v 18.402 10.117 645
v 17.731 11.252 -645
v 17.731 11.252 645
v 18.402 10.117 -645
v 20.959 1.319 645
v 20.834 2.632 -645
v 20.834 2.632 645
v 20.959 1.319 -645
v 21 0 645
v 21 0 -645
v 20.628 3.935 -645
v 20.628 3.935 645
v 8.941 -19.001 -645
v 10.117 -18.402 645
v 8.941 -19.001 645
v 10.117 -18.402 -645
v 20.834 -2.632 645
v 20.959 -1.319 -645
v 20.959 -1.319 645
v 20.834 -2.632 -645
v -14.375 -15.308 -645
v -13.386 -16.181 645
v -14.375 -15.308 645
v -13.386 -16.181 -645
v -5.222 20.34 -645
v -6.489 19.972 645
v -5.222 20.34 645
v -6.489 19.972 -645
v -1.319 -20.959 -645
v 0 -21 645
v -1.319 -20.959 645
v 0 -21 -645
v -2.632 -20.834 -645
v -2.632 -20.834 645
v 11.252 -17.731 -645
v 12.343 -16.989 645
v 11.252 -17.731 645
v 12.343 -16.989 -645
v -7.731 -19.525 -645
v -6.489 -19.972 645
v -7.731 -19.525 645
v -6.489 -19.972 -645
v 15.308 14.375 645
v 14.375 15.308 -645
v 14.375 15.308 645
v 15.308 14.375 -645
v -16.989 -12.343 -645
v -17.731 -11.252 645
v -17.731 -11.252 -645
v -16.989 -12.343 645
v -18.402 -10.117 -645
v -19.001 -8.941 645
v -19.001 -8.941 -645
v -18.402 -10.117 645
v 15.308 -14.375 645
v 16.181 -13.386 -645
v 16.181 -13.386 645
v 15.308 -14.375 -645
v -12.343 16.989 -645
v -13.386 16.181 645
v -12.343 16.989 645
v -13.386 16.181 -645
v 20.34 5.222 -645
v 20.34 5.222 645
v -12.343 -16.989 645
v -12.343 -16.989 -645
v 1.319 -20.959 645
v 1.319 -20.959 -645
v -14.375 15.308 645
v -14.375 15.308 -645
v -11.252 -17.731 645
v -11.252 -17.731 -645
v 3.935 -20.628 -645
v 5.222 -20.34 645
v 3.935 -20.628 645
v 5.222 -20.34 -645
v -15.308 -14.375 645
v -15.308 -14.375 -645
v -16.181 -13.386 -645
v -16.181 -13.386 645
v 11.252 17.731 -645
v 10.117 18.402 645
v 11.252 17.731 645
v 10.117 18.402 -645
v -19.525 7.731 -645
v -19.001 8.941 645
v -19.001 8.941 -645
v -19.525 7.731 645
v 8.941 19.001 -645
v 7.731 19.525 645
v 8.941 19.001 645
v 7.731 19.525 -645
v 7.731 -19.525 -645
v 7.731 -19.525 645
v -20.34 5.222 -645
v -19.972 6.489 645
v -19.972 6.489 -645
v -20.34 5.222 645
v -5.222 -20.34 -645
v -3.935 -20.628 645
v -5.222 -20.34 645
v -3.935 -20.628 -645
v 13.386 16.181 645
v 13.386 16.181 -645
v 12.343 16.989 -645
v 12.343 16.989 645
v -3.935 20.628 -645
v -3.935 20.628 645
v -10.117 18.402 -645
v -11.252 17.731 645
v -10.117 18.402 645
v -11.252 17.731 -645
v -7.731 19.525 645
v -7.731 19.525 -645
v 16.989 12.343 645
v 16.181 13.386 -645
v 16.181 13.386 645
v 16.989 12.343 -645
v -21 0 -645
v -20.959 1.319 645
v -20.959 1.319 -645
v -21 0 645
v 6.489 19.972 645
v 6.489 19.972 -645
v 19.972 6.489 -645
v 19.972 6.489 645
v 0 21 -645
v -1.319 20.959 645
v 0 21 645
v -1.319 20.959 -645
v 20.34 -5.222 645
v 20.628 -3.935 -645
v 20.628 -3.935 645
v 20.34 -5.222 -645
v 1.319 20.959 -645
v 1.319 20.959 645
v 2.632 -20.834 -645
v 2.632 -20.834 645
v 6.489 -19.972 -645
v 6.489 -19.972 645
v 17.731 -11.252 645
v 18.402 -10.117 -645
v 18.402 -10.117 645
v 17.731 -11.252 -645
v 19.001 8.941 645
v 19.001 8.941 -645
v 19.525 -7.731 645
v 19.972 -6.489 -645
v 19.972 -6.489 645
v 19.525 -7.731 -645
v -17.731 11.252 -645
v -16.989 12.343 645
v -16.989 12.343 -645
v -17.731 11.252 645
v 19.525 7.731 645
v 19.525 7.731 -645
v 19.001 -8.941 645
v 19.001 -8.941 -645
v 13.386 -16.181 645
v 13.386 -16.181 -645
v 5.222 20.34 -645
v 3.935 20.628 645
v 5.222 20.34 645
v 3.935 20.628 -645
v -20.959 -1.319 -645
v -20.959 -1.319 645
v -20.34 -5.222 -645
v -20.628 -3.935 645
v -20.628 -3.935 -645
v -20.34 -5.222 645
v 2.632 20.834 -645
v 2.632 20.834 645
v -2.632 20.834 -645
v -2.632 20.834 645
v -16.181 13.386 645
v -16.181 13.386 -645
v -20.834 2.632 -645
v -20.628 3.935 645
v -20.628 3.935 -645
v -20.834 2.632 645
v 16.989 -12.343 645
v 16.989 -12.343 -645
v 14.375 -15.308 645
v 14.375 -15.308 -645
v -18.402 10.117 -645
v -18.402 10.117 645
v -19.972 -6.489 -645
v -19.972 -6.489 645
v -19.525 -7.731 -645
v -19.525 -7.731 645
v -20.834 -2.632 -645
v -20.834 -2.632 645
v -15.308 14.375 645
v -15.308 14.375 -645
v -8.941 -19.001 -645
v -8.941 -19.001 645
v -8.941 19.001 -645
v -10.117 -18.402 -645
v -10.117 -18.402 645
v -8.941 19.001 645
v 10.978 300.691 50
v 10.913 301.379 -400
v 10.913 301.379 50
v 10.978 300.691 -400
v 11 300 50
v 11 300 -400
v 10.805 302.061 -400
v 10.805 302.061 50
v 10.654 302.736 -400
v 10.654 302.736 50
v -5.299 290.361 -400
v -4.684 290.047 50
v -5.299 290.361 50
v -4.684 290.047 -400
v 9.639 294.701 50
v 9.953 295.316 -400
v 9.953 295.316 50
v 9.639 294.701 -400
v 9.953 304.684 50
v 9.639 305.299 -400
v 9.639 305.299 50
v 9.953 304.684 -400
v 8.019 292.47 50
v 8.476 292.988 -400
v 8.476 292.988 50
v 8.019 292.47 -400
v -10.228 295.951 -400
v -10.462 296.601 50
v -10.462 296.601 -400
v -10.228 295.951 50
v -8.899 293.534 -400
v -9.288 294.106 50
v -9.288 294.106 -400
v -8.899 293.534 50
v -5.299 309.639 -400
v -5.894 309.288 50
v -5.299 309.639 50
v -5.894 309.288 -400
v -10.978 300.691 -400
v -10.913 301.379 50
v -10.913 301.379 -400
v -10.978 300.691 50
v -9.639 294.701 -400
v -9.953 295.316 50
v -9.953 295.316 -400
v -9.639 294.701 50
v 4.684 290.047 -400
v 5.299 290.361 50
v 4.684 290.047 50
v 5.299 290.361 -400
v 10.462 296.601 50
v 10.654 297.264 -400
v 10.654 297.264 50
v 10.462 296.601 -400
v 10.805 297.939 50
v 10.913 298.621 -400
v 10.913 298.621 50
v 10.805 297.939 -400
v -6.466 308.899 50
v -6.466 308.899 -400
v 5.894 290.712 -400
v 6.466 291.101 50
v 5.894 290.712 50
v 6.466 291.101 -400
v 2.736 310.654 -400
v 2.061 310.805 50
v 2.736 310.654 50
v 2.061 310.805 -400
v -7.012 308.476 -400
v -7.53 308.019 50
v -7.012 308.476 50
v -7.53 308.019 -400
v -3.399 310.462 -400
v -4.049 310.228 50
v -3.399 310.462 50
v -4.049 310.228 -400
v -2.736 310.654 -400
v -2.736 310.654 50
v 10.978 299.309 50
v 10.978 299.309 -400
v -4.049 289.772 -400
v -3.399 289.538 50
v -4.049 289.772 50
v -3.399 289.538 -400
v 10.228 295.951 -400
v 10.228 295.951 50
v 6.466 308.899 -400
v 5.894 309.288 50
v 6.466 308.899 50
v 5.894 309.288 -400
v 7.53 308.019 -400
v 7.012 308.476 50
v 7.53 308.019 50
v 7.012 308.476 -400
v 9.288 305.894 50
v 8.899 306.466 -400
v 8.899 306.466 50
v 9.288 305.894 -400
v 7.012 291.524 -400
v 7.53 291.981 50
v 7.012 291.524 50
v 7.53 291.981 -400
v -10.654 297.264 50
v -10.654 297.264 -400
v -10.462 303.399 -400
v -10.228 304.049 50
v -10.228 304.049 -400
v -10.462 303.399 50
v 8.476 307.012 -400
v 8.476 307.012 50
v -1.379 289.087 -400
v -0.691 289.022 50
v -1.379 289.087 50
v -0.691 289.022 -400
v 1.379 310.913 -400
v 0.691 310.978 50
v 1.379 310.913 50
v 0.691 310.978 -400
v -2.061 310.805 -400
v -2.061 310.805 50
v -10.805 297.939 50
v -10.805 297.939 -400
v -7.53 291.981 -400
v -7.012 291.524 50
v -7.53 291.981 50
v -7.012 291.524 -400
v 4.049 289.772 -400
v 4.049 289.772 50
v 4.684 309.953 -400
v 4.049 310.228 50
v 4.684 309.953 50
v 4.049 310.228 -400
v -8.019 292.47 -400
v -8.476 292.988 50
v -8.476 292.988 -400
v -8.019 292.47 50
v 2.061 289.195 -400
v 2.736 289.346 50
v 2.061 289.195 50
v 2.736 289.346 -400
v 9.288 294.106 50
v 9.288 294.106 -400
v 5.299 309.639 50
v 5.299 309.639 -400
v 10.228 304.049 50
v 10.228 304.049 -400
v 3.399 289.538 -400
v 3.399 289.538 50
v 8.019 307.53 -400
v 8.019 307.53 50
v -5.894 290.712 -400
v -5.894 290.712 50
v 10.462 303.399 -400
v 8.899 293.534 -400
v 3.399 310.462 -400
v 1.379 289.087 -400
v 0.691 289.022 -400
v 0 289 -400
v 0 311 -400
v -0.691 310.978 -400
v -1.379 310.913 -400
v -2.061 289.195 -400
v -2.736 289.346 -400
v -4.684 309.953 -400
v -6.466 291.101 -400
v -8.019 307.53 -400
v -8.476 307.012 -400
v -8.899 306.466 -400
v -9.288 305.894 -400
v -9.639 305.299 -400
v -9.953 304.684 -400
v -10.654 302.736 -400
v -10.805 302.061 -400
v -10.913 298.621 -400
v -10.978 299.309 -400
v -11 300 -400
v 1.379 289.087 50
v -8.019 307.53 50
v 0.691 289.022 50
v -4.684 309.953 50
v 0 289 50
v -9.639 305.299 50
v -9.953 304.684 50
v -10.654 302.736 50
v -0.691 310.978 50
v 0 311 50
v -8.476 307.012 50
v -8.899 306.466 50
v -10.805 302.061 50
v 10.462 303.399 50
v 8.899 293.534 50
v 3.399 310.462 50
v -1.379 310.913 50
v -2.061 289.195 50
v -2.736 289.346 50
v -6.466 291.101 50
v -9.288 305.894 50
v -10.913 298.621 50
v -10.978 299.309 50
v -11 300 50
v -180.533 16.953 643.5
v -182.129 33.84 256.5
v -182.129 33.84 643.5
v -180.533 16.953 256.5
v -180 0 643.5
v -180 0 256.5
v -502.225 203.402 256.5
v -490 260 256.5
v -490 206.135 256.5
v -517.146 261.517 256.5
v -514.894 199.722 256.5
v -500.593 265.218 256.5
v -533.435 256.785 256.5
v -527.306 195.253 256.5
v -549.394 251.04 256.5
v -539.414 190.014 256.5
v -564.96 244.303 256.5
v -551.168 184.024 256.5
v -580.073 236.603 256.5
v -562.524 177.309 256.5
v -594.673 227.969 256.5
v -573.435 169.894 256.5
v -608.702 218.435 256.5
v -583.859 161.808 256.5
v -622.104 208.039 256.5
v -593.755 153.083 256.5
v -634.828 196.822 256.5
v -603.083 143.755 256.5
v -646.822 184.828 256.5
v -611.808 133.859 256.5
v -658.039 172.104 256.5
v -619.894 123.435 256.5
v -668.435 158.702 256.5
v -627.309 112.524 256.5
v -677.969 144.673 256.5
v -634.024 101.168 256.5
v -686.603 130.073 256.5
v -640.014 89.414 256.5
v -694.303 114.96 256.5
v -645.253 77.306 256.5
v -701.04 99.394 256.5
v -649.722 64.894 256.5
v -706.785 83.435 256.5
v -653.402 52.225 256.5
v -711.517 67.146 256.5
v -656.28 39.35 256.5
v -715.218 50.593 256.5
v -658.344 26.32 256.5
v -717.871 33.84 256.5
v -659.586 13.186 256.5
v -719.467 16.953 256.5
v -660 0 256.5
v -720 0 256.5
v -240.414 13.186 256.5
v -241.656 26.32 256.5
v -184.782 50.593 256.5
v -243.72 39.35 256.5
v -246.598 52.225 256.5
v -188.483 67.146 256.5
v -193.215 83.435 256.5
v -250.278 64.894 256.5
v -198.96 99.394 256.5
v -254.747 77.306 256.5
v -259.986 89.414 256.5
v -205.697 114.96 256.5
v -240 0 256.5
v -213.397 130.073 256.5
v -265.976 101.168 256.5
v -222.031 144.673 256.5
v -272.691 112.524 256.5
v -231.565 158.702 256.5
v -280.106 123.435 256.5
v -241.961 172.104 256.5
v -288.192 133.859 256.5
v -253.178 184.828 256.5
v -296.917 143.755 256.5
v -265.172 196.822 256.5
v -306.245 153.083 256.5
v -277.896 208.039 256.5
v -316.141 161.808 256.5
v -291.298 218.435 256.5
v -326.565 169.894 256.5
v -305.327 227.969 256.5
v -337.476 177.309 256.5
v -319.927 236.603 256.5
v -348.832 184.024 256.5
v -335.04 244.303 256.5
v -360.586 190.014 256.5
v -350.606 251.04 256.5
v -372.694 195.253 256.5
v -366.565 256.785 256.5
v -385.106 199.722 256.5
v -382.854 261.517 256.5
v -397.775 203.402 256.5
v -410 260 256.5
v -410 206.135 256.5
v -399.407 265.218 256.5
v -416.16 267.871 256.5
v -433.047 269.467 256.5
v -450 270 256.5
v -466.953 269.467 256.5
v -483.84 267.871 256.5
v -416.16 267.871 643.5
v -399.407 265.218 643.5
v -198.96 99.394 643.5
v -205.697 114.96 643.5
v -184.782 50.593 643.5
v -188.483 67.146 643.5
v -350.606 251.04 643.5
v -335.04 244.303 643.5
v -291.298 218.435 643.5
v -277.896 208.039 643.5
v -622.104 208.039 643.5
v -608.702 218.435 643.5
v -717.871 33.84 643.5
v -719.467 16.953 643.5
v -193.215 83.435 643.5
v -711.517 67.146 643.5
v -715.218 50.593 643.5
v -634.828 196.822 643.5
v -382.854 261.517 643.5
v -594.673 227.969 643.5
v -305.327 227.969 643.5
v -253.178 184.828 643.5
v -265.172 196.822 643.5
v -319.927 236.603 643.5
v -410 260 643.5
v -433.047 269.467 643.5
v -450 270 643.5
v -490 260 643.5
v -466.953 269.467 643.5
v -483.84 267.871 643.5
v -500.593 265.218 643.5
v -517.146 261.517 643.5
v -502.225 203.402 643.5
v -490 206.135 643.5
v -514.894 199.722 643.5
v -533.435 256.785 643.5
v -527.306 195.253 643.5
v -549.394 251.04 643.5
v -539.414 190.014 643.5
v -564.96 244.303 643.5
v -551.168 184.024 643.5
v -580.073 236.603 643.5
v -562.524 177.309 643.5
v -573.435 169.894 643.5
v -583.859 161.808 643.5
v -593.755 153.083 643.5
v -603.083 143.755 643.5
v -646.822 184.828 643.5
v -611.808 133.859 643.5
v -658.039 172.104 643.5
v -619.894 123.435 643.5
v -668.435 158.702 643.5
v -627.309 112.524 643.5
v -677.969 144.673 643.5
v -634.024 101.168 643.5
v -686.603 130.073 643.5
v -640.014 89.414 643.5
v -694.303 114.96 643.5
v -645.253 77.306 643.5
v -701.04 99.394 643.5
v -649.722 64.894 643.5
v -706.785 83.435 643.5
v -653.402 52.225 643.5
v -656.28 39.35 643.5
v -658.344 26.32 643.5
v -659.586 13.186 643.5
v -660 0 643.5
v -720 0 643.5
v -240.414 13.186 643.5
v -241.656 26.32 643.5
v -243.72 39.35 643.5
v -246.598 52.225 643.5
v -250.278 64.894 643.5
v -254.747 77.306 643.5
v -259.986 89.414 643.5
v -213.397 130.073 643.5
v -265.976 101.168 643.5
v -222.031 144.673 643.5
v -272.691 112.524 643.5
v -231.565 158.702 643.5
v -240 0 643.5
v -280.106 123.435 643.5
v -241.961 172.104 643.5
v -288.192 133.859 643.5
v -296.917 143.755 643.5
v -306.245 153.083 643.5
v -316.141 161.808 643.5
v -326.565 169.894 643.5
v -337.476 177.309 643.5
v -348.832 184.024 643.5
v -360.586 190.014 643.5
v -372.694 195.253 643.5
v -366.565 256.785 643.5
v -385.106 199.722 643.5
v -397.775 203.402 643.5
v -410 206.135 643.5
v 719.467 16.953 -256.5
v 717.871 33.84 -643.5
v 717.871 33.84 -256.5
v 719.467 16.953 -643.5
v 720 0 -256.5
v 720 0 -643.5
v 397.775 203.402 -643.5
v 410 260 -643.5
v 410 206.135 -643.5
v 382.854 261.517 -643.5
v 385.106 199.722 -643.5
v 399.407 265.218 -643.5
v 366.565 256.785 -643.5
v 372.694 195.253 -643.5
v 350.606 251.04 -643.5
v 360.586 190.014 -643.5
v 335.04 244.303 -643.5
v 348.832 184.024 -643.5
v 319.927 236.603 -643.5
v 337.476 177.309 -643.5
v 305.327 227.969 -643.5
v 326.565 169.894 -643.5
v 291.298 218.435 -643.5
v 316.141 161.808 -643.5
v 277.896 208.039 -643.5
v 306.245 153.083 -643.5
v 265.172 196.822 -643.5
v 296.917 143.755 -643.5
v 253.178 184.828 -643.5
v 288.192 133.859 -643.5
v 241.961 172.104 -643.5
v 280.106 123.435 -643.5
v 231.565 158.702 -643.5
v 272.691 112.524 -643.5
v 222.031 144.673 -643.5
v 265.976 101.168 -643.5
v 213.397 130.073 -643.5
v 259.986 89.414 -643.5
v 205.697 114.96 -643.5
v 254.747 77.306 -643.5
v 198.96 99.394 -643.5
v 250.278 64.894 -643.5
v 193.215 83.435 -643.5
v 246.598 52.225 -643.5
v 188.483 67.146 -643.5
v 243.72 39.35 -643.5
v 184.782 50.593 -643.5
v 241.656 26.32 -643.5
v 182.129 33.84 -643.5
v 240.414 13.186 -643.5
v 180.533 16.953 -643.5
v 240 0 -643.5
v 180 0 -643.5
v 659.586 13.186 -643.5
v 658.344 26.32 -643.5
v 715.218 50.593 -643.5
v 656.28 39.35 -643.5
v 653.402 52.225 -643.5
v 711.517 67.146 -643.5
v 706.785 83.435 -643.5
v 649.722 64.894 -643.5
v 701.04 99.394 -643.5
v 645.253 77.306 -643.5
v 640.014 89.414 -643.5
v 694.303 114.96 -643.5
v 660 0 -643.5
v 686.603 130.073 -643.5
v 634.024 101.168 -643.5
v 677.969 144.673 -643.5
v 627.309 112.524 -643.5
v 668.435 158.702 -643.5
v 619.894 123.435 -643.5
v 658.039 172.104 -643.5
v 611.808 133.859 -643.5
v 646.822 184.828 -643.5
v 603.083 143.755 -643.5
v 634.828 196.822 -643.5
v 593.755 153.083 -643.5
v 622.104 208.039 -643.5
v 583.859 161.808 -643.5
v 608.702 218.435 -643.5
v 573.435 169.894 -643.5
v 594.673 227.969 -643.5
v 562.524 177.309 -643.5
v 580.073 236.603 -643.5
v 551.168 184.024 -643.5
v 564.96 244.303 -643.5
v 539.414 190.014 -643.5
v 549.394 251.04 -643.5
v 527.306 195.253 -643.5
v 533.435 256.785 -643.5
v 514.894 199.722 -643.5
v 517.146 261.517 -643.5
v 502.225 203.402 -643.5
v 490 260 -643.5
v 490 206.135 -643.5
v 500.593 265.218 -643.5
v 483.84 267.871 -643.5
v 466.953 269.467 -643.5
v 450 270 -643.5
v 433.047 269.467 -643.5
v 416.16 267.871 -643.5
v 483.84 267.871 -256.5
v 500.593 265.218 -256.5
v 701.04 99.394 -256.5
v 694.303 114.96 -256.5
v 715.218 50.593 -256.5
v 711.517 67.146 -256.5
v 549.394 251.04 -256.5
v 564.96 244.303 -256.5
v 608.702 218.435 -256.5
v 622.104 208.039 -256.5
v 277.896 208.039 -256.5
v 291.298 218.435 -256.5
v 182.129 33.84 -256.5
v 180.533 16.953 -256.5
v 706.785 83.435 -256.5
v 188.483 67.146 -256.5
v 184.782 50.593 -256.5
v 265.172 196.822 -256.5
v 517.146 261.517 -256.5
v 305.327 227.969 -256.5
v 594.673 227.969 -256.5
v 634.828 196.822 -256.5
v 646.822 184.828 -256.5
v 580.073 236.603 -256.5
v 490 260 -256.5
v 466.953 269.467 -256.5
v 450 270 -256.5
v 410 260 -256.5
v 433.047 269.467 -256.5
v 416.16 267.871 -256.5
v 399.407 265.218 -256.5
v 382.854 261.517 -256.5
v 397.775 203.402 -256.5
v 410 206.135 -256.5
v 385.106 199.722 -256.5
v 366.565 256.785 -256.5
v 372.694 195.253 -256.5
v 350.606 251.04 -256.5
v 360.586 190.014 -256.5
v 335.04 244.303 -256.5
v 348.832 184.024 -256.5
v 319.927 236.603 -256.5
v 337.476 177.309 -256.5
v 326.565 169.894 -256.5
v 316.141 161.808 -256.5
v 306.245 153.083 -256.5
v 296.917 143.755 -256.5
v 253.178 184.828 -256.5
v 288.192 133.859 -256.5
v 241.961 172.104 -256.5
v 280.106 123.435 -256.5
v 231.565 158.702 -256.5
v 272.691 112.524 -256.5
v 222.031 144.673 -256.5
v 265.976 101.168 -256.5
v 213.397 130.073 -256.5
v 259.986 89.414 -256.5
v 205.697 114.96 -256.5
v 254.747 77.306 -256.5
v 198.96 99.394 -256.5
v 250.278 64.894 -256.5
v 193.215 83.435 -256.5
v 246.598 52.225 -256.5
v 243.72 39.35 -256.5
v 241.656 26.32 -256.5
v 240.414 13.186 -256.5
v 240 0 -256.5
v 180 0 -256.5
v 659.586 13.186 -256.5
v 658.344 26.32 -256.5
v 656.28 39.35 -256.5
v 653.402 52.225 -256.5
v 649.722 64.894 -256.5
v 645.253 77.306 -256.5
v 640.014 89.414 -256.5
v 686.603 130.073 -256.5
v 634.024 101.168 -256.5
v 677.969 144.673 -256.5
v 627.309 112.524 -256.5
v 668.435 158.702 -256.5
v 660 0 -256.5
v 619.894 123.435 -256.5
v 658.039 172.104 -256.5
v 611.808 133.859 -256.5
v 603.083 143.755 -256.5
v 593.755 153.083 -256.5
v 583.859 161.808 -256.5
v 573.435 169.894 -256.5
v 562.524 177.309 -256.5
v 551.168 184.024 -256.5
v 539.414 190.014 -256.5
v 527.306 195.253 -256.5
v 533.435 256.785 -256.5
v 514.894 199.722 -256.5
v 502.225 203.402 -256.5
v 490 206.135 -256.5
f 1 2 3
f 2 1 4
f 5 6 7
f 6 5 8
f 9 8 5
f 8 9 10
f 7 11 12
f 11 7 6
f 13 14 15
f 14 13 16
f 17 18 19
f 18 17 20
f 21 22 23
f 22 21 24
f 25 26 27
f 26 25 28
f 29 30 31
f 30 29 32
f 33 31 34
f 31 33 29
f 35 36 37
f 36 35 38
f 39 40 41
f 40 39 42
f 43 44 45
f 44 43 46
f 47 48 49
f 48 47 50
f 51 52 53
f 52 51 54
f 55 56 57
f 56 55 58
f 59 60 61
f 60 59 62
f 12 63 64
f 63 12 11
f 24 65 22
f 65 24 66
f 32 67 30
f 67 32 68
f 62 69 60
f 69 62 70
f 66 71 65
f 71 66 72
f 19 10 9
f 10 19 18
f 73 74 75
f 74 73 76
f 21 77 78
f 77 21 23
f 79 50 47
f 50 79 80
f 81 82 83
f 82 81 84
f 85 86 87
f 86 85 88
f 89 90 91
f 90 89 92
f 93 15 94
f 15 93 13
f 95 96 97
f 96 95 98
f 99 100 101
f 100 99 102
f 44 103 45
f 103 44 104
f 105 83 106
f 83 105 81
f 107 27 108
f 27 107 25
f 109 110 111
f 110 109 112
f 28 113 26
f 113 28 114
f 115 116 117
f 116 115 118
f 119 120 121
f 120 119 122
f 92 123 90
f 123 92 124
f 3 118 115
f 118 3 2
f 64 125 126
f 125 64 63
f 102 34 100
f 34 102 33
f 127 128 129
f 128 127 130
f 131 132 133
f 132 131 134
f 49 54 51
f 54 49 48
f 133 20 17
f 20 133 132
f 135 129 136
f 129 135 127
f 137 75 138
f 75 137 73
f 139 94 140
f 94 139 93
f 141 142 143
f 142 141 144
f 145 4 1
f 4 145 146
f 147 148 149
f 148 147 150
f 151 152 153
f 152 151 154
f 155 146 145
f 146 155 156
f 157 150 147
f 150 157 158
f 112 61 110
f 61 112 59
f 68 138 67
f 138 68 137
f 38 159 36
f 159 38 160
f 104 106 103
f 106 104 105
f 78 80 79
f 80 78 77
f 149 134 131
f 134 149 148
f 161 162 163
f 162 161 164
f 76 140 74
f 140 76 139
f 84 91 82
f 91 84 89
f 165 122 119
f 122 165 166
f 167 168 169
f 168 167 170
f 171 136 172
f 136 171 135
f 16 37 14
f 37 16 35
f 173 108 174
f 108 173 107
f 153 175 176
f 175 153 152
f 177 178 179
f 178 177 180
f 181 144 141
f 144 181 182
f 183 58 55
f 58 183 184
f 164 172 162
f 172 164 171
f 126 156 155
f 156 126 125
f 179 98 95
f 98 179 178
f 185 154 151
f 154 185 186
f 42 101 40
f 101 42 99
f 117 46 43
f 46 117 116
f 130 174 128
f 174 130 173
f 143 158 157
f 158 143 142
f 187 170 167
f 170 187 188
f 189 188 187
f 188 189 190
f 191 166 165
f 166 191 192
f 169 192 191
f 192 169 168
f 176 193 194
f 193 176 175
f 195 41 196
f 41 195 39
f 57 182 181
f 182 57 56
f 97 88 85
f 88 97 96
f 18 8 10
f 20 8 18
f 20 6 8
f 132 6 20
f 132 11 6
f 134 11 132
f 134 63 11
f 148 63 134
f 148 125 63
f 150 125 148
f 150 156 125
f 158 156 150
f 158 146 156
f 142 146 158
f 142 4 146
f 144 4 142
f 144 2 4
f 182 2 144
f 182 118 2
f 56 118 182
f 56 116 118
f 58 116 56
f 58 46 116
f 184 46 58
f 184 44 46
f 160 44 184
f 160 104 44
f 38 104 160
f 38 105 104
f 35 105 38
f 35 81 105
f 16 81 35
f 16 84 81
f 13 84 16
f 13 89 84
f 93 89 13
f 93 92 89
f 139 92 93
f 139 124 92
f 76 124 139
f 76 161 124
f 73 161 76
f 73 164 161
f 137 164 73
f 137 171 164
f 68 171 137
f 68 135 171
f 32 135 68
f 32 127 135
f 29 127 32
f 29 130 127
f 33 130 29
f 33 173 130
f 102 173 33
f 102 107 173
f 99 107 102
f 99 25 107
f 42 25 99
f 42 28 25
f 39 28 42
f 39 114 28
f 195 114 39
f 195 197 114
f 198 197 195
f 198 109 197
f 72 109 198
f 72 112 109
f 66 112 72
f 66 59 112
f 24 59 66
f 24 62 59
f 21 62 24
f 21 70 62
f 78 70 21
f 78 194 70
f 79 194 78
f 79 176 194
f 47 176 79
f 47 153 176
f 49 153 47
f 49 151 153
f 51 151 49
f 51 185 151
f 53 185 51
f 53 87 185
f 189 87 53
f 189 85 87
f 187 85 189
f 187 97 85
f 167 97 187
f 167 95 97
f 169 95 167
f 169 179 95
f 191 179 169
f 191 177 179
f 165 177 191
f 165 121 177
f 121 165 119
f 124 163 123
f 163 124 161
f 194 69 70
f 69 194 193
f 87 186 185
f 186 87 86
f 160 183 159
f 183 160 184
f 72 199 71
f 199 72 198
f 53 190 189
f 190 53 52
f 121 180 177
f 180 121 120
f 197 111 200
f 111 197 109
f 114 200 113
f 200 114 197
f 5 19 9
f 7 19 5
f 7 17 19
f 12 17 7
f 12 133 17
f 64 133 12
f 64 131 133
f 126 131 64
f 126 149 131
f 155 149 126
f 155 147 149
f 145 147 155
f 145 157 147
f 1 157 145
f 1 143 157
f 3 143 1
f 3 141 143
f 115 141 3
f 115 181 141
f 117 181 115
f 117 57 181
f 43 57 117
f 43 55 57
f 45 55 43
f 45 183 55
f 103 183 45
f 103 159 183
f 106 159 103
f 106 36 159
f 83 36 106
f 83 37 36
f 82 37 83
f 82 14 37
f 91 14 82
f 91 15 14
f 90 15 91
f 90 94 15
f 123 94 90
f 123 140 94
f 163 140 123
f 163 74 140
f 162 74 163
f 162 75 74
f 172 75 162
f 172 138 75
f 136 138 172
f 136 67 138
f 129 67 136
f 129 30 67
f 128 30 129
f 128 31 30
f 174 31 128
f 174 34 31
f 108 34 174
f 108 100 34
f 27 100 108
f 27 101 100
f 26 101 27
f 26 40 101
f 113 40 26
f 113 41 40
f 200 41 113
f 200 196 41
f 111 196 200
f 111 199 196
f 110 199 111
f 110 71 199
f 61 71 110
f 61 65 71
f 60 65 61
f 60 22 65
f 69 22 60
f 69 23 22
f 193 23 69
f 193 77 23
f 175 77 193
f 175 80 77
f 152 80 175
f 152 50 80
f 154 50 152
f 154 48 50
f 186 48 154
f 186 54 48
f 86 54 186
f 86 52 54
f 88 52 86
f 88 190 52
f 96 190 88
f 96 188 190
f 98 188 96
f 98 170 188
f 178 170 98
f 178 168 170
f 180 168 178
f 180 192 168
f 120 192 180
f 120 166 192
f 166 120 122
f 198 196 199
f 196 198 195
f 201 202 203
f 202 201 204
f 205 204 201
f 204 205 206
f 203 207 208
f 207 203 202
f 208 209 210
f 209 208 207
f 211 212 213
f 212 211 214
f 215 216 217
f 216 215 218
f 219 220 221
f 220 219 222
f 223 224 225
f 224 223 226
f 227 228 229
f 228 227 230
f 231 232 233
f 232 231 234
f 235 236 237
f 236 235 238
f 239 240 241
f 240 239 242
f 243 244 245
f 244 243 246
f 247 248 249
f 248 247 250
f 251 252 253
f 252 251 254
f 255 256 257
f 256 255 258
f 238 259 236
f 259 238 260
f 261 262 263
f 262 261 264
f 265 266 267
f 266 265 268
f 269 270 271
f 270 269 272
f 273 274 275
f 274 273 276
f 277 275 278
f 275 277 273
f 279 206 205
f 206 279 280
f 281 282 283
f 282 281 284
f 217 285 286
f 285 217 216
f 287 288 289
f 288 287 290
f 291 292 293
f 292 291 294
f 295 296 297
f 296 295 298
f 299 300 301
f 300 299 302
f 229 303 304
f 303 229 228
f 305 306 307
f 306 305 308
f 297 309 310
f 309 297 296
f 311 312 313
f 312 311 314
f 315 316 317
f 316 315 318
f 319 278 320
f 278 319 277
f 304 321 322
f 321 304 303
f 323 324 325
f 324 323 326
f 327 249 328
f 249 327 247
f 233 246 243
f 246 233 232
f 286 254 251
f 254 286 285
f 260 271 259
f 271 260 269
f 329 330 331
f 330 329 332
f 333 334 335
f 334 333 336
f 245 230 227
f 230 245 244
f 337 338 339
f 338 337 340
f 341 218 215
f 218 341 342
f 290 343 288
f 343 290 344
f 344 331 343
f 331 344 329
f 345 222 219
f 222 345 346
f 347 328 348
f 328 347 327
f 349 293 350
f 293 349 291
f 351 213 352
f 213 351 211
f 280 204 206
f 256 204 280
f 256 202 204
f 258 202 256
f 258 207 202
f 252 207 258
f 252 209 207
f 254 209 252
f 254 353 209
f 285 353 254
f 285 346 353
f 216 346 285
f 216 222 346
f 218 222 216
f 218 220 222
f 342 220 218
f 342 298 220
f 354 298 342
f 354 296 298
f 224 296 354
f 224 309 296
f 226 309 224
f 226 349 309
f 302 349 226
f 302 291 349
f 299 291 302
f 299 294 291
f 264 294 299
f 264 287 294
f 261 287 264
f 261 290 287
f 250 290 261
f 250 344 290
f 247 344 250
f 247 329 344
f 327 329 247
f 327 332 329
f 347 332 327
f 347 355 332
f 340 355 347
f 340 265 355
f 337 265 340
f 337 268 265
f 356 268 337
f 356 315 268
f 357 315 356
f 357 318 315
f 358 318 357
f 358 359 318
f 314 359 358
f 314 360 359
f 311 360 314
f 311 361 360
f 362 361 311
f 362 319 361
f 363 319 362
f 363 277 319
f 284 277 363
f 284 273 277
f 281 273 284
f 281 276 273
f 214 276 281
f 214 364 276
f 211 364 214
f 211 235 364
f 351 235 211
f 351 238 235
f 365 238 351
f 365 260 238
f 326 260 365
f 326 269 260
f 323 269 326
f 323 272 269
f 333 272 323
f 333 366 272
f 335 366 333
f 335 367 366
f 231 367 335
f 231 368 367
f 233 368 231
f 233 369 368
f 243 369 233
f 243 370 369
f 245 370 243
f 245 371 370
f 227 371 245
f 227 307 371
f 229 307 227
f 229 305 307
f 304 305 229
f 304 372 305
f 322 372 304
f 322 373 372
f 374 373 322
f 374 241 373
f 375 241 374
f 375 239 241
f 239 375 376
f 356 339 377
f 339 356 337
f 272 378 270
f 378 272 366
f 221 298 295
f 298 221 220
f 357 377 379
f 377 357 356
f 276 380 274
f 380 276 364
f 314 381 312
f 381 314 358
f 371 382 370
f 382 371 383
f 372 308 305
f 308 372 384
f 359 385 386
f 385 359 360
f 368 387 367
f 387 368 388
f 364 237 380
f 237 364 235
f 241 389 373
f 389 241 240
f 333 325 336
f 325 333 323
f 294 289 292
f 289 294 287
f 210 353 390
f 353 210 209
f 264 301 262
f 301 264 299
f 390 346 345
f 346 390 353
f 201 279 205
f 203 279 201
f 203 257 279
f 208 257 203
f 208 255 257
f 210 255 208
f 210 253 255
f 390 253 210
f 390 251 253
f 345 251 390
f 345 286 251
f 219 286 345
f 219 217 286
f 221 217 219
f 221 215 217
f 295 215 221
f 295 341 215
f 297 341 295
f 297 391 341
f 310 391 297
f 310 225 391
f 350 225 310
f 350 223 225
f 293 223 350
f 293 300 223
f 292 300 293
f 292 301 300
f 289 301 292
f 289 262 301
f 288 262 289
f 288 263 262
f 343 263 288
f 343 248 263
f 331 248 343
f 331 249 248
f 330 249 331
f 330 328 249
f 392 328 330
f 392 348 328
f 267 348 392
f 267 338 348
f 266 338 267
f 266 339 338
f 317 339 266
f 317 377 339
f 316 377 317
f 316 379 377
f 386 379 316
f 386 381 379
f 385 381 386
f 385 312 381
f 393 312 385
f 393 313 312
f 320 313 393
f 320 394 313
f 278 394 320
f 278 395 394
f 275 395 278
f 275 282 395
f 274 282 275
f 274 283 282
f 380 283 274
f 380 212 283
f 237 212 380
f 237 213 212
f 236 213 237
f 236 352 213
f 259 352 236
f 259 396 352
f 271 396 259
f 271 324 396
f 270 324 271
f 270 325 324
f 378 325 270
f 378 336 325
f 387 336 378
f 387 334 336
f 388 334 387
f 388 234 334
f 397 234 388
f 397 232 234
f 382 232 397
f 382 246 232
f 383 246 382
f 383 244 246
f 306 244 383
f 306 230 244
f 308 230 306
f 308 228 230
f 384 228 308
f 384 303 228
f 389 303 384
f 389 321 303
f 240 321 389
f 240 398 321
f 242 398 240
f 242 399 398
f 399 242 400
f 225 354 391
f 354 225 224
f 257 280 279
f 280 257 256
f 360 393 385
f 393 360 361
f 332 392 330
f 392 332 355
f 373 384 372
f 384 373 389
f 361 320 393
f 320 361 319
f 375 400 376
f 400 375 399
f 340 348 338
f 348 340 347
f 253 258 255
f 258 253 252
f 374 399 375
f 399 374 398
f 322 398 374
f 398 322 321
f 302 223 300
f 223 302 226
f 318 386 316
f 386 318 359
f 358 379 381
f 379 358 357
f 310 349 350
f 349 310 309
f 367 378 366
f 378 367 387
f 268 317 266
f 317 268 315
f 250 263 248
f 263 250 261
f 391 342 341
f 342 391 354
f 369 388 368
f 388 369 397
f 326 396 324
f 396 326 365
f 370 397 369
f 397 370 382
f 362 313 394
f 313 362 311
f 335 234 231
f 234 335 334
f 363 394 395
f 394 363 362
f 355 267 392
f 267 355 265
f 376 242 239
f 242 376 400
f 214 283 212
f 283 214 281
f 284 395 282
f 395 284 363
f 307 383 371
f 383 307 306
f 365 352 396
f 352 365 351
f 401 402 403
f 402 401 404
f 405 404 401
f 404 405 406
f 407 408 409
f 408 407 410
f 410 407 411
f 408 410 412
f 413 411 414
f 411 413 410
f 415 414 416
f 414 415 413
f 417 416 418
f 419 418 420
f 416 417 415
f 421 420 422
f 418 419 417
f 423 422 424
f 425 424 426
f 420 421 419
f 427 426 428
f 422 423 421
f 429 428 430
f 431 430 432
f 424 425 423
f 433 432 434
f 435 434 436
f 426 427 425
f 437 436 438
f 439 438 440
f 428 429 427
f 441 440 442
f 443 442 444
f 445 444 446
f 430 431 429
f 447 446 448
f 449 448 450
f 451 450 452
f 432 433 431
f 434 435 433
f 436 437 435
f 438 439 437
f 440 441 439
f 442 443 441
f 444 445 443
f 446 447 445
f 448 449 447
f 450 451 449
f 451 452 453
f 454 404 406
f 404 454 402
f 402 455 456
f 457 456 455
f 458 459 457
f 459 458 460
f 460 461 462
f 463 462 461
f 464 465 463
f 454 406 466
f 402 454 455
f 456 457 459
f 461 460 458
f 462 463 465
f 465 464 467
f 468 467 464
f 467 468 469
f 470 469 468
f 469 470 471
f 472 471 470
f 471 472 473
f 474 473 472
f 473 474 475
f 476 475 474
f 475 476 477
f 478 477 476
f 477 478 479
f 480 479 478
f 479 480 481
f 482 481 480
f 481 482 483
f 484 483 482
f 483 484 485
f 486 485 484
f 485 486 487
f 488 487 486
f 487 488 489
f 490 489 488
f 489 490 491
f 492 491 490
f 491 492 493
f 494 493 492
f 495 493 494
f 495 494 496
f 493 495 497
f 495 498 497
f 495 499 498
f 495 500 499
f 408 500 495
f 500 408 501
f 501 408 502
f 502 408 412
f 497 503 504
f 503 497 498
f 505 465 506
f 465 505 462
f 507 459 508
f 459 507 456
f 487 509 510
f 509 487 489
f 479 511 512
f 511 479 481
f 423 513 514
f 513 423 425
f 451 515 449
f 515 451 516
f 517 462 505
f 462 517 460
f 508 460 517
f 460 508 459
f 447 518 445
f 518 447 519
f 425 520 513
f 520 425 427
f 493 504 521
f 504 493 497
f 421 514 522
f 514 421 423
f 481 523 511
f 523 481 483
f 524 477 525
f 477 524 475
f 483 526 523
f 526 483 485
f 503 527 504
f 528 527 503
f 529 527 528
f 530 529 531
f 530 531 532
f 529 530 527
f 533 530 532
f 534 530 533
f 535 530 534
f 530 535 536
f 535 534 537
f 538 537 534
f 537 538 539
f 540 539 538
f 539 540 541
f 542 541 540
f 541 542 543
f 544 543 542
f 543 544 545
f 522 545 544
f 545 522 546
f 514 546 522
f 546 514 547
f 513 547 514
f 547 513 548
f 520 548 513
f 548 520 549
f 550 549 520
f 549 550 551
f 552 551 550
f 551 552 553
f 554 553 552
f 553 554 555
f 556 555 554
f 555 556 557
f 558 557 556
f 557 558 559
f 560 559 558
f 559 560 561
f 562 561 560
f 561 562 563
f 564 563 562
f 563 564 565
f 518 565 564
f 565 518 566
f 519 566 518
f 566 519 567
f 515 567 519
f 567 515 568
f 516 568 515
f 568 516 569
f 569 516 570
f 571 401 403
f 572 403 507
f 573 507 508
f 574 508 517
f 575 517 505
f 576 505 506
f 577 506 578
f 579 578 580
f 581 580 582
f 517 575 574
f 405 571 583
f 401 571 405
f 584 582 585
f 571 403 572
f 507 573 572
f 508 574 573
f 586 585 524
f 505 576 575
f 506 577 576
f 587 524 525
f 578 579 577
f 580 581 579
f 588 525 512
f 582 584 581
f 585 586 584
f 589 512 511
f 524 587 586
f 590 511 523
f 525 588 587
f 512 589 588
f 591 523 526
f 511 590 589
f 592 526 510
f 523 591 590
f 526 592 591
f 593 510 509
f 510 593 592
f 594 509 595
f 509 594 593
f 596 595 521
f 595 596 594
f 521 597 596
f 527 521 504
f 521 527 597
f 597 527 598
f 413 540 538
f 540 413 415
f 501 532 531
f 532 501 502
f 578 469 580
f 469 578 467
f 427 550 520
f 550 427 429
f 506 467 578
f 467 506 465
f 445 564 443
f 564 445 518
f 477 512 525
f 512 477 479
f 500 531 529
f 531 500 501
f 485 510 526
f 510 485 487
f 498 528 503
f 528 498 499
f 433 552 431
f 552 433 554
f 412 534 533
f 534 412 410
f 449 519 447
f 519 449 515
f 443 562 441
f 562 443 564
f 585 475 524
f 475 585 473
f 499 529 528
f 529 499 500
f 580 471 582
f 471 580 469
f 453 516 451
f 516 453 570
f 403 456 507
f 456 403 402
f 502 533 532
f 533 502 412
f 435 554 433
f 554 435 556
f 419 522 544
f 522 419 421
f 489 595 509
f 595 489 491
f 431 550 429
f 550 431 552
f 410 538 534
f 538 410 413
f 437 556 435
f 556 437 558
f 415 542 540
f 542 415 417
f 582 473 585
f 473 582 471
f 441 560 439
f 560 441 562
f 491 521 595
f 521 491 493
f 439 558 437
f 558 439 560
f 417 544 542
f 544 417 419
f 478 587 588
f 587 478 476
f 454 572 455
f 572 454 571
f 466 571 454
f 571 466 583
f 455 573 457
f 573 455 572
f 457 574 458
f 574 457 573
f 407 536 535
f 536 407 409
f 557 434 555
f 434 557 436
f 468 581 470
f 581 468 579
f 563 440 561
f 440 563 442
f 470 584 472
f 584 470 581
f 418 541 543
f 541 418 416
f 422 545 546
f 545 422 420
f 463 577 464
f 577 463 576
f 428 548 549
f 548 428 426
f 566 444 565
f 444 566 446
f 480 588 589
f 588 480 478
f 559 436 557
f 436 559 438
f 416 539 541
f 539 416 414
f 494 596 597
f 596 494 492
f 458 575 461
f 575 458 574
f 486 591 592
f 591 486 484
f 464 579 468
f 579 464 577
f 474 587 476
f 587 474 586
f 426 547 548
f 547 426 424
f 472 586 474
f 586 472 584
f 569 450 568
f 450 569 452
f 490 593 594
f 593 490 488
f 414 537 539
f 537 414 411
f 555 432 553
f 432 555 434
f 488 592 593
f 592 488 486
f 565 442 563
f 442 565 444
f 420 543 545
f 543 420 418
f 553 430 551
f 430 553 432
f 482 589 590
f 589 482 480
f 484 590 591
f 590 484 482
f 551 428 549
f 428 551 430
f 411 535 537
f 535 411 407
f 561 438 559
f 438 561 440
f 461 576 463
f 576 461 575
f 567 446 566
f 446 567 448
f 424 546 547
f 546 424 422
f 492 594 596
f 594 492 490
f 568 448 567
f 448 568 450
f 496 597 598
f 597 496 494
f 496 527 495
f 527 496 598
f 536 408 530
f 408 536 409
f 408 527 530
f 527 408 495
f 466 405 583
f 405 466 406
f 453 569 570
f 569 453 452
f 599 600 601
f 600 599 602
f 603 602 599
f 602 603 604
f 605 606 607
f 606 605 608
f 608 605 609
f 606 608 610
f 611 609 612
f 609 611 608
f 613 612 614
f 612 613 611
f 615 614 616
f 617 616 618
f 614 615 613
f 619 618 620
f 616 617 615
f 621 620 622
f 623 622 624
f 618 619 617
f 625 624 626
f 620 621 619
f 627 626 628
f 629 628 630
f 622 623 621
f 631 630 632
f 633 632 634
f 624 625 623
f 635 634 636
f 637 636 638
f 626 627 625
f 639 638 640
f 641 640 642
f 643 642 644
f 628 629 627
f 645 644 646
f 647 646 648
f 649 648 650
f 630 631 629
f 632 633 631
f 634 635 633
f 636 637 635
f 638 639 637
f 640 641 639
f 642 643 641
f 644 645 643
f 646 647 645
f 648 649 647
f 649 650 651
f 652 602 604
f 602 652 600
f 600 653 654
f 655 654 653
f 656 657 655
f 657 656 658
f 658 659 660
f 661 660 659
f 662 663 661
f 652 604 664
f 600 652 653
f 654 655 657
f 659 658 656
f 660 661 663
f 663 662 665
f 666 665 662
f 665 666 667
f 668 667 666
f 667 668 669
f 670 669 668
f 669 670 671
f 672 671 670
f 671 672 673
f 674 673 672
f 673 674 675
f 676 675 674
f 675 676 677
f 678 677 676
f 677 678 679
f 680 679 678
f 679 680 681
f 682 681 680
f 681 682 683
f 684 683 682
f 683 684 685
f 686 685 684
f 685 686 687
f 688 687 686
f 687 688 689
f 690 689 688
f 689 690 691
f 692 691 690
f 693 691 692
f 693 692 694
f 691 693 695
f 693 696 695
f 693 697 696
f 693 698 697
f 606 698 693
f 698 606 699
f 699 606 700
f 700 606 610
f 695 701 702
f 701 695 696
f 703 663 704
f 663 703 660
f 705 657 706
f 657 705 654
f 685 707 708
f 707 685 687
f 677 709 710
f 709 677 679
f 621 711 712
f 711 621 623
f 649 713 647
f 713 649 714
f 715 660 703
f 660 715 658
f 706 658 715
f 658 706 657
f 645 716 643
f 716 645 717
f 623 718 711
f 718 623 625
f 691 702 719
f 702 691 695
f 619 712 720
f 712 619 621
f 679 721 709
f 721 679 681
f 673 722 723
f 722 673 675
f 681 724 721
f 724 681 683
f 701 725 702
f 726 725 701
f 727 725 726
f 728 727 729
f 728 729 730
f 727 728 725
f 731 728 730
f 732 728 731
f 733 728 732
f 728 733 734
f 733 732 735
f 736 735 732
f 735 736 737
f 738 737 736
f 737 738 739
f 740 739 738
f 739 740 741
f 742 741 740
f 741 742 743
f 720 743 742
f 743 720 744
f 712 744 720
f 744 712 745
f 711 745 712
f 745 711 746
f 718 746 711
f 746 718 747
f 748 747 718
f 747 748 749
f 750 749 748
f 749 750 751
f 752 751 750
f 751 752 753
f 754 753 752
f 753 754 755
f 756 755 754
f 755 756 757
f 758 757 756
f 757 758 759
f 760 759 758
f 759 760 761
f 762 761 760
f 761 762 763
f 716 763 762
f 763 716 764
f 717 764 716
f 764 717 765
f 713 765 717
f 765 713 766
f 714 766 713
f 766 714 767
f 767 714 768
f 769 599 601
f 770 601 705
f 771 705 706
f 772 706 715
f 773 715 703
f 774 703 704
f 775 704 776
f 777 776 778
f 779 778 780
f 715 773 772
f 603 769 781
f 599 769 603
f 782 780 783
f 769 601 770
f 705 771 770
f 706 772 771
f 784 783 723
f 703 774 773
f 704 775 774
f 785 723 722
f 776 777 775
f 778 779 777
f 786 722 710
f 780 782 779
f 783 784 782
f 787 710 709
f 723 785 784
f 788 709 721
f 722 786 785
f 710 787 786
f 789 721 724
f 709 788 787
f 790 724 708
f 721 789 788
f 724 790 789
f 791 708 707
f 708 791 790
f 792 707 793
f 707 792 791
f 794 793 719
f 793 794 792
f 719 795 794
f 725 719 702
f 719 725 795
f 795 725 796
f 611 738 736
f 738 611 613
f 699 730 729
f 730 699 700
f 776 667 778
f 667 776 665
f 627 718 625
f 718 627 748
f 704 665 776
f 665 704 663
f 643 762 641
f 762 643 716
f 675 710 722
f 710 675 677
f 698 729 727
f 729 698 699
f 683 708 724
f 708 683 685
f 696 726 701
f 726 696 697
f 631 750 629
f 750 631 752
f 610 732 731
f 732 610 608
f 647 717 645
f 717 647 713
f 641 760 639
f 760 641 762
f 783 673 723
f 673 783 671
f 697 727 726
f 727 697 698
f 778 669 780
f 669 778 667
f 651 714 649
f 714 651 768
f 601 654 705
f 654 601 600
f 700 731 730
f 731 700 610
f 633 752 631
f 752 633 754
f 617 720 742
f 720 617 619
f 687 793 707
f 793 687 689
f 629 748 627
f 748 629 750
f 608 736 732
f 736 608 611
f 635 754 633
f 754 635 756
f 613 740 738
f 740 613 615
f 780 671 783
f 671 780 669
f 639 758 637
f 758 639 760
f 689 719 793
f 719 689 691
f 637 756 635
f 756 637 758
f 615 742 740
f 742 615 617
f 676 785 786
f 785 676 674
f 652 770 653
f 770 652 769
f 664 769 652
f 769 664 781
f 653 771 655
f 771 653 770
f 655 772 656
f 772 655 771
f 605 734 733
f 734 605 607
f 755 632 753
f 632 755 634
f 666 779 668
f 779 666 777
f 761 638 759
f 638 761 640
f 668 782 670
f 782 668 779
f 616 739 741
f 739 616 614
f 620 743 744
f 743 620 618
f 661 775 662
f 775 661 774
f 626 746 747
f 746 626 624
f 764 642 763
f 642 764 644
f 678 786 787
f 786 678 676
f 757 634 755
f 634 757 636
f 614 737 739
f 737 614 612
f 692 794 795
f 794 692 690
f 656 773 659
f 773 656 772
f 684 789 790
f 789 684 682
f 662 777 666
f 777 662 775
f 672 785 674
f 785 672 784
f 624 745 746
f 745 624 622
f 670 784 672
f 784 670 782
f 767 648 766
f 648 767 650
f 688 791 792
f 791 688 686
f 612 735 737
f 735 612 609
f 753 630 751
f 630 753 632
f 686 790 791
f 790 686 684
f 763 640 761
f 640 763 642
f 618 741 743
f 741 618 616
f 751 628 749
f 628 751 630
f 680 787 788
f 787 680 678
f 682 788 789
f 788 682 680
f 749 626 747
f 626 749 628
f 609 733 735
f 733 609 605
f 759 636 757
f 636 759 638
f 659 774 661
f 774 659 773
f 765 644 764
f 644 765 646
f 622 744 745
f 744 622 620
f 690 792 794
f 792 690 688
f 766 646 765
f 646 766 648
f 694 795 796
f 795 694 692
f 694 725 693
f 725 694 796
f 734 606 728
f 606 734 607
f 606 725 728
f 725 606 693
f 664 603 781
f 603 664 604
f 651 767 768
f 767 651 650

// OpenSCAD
// ============================================================================
// PROJECT: XXXG-00W0 WING GUNDAM ZERO EW - LOWER AIRFRAME CORE INFRA
// COMPONENT VAULT: BANDAI CAST RUNNER F - BACKFRAME HINGES F17 & F18
// PACKAGING RE-ARCHITECTURE: SUB-ARMOR CAPACITOR RECESSED BANK INTEGRATION
// CONFIG METRIC: SCALED TITANIUM CASTS (1:1 ACTUAL METRIC UP-SCALE)
// ============================================================================

$fn = 100; // Circular segment rendering resolution count

// Structural Constants Scaled 1:1 for a 16.7-Meter Airframe Scale (mm)
hinge_total_length = 860;                // Total longitudinal vertical height (mm)
pivot_bore_diameter = 420;               // Core cycloidal stabilizer pin width (mm)
armor_skin_thickness = 60;              // Solid TiAl protective plating wall (mm)
harness_conduit_width = 80;             // Cast-in 4oz copper logic trace track (mm)
capacitor_pocket_depth = 15;            // Sub-armor recessed housing pocket depth (mm)
capacitor_pocket_width = 140;           // Transverse MLCC array pocket width (mm)

module Runner_F_Backframe_Hinge_Forge() {
    // Central Supply Injection Runner Axis (Molten Feed Line from Siphon Forge)
    color([0.24, 0.24, 0.26]) {
        cylinder(h = hinge_total_length * 1.5, d = 42, center = true);
        // Direct injection gates tracking straight into the part mold cavities
        translate() rotate() cylinder(h = 450, d = 22);
        translate([0, 300, -400]) rotate() cylinder(h = 450, d = 22);
    }
    
    // Instantiate Scaled Skeutomorphic Part Molds Symmetrically (Left & Right)
    Cast_Internal_Backframe_Hinges();
}

module Cast_Internal_Backframe_Hinges() {
    // ---- PART F17: INTERNAL LEFT LOWER CORE BACKFRAME STABILIZER HINGE ---- [Page 18, Step 10-3]
    translate([-450, 0, 450]) color([0.35, 0.35, 0.38]) { // Inner Frame Dark Spec
        difference() {
            // Main solid heavy-duty core hinge block segment
            cylinder(h = hinge_total_length * 0.45, d = pivot_bore_diameter + (armor_skin_thickness * 2), center = true);
            
            // Central Cycloidal Pivot Track Bore (Houses pre-loaded alignment pins)
            cylinder(h = hinge_total_length * 0.5, d = pivot_bore_diameter, center = true);
            
            // SUB-ARMOR RECESSED CAPACITOR POCKETS [Segmented rows cut inside the armor inner wall]
            for (z_offset = [-150, 0, 150]) {
                translate([0, (pivot_bore_diameter/2 - armor_skin_thickness + capacitor_pocket_depth/2), z_offset])
                    cube([capacitor_pocket_width, capacitor_pocket_depth, 100], center = true);
            }
            
            // Continuous cast-in routing track for the 4oz solid-state wiring rails
            cube([harness_conduit_width, pivot_bore_diameter + 100, hinge_total_length], center = true);
            
            // Slicing profile tool to generate an asymmetrical half-shell part component
            translate([0, -pivot_bore_diameter, 0])
                cube([pivot_bore_diameter * 2, pivot_bore_diameter * 2, hinge_total_length * 2], center = true);
        }
    }
    
    // ---- PART F18: INTERNAL RIGHT LOWER CORE BACKFRAME STABILIZER HINGE ---- [Page 18, Step 10-3]
    translate([450, 0, -450]) rotate() color([0.35, 0.35, 0.38]) {
        difference() {
            cylinder(h = hinge_total_length * 0.45, d = pivot_bore_diameter + (armor_skin_thickness * 2), center = true);
            cylinder(h = hinge_total_length * 0.5, d = pivot_bore_diameter, center = true);
            
            for (z_offset = [-150, 0, 150]) {
                translate([0, (pivot_bore_diameter/2 - armor_skin_thickness + capacitor_pocket_depth/2), z_offset])
                    cube([capacitor_pocket_width, capacitor_pocket_depth, 100], center = true);
            }
            
            cube([harness_conduit_width, pivot_bore_diameter + 100, hinge_total_length], center = true);
            translate([0, -pivot_bore_diameter, 0])
                cube([pivot_bore_diameter * 2, pivot_bore_diameter * 2, hinge_total_length * 2], center = true);
        }
    }
}

// Render Master Assembly to Parameter Workspace
Runner_F_Backframe_Hinge_Forge();
